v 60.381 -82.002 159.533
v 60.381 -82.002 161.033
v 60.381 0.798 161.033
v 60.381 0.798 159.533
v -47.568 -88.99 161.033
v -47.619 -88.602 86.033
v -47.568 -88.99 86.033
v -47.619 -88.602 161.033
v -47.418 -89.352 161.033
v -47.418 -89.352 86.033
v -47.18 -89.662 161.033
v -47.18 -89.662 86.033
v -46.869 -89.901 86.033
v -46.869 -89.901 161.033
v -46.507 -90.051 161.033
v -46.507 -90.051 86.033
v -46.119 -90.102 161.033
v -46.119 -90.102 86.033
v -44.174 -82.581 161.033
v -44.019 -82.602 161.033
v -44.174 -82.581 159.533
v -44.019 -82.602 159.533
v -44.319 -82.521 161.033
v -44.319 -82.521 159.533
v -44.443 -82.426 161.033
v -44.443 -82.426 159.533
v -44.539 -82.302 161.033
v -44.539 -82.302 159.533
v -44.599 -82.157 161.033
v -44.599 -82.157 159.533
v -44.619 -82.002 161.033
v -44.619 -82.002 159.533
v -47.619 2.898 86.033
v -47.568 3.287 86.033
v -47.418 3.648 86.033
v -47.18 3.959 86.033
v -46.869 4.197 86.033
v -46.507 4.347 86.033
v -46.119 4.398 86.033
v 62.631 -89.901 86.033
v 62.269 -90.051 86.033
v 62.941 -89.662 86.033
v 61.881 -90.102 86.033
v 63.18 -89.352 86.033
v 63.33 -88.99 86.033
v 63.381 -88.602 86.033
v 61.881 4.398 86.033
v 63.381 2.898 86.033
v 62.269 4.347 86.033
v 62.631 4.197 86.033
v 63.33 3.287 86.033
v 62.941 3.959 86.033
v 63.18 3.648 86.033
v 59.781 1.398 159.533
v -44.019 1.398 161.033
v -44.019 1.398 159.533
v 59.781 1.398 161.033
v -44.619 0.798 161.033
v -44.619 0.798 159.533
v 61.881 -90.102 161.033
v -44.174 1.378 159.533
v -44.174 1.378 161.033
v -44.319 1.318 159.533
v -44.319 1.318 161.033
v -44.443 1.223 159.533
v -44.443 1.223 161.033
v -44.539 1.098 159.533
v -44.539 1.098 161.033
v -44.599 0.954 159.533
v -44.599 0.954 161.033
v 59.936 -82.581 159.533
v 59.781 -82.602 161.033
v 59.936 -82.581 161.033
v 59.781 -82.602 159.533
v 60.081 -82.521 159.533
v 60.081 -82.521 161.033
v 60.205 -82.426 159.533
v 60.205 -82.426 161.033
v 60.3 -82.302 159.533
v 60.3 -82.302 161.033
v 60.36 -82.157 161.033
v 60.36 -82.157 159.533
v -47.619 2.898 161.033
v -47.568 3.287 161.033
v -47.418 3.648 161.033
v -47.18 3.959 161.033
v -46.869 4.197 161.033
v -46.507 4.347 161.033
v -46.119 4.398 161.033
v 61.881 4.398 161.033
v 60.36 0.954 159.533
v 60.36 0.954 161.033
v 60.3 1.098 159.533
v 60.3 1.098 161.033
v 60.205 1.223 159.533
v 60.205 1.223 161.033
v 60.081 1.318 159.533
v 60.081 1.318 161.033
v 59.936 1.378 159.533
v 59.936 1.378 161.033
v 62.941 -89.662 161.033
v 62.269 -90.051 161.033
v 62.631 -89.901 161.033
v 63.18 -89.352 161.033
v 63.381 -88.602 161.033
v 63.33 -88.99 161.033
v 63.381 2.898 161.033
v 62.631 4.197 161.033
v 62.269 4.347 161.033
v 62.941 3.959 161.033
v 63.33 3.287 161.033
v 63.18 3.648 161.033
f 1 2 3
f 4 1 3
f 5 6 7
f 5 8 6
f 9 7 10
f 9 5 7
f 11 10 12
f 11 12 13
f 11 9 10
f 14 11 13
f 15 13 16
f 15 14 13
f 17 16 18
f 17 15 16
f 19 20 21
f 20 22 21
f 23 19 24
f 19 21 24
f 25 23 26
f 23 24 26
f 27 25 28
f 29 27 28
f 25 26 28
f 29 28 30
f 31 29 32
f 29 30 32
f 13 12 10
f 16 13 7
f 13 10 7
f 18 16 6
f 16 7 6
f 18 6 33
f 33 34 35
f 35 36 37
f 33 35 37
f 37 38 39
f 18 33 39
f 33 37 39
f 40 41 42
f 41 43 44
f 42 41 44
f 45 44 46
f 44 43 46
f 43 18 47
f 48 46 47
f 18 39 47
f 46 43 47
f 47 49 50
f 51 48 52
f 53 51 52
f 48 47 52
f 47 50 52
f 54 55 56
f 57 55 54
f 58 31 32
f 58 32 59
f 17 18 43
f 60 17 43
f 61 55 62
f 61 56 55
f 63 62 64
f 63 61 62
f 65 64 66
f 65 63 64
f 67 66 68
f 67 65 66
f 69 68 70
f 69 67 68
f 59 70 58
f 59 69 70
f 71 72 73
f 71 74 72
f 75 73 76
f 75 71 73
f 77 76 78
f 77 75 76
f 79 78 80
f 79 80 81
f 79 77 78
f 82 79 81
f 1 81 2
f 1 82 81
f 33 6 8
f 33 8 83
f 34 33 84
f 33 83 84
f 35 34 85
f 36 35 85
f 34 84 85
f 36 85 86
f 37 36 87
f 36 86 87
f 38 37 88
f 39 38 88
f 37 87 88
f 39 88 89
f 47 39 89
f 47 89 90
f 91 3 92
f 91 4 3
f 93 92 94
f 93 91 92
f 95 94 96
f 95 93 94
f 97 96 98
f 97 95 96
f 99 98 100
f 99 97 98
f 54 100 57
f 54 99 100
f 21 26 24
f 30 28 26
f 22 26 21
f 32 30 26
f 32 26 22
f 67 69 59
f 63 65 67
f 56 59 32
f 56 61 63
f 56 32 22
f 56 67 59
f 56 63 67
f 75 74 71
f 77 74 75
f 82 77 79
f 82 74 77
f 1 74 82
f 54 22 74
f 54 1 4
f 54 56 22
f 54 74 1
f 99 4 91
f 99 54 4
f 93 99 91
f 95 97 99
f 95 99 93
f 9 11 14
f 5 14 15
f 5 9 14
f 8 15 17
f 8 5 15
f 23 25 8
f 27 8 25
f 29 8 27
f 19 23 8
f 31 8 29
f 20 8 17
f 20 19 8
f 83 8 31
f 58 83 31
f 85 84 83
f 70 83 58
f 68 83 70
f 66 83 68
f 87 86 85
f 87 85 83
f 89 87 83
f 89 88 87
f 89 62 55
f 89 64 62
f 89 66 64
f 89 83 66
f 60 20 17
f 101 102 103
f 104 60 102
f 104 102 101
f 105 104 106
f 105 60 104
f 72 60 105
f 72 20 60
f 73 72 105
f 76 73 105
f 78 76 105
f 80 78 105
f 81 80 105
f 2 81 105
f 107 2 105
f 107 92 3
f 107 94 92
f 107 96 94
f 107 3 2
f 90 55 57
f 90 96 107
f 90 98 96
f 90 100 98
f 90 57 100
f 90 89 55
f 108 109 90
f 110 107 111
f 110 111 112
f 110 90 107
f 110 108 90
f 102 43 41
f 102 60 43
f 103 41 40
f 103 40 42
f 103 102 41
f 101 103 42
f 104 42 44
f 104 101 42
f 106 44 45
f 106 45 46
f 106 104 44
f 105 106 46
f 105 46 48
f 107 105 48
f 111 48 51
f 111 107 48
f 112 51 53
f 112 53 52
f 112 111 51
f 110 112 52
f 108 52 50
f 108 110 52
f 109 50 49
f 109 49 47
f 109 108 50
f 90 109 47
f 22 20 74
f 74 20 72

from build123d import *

# Parameters (mm, degrees)
SKETCH1_W           = 370
SKETCH1_H           = 315
BOSS_EXTRUDE1_DEPTH = 250
FILLET2_R           = 5
SKETCH3_W           = 350
SKETCH3_H           = 280
CUT_EXTRUDE1_DEPTH  = 5
FILLET3_R           = 2
SCALE3_SCALE        = 0.3


with BuildPart() as part:
    # Sketch1 → Boss-Extrude1 (new body)
    with BuildSketch(Plane.XY):
        with Locations((7.880798198, -42.761829759)):
            Rectangle(SKETCH1_W, SKETCH1_H)
    extrude(amount=BOSS_EXTRUDE1_DEPTH)

    # Fillet2
    fillet2_edges = [part.edges().sort_by_distance(p)[0] for p in [
        (-177.119201802, 114.738170241, 125),
        (192.880798198, 114.738170241, 125),
        (192.880798198, -200.261829759, 125),
        (-177.119201802, -200.261829759, 125),
    ]]
    fillet(fillet2_edges, radius=FILLET2_R)

    # Sketch3 → Cut-Extrude1 (cut)
    with BuildSketch(Plane.XY.offset(250)):
        with Locations((7.880798198, -35.261829759)):
            Rectangle(SKETCH3_W, SKETCH3_H)
    extrude(amount=-CUT_EXTRUDE1_DEPTH, mode=Mode.SUBTRACT)

    # Fillet3
    fillet3_edges = [part.edges().sort_by_distance(p)[0] for p in [
        (-167.119201802, -175.261829759, 247.5),
        (-167.119201802, 104.738170241, 247.5),
        (182.880798198, 104.738170241, 247.5),
        (182.880798198, -175.261829759, 247.5),
    ]]
    fillet(fillet3_edges, radius=FILLET3_R)


with BuildPart() as part_1:
    # Scale3: scaled about (7.880798198, -42.890132661, 122.904385933)
    add(part.part.scale(SCALE3_SCALE).moved(Location((5.516558739, -30.023092863, 86.033070153))))


solid = part_1.part
